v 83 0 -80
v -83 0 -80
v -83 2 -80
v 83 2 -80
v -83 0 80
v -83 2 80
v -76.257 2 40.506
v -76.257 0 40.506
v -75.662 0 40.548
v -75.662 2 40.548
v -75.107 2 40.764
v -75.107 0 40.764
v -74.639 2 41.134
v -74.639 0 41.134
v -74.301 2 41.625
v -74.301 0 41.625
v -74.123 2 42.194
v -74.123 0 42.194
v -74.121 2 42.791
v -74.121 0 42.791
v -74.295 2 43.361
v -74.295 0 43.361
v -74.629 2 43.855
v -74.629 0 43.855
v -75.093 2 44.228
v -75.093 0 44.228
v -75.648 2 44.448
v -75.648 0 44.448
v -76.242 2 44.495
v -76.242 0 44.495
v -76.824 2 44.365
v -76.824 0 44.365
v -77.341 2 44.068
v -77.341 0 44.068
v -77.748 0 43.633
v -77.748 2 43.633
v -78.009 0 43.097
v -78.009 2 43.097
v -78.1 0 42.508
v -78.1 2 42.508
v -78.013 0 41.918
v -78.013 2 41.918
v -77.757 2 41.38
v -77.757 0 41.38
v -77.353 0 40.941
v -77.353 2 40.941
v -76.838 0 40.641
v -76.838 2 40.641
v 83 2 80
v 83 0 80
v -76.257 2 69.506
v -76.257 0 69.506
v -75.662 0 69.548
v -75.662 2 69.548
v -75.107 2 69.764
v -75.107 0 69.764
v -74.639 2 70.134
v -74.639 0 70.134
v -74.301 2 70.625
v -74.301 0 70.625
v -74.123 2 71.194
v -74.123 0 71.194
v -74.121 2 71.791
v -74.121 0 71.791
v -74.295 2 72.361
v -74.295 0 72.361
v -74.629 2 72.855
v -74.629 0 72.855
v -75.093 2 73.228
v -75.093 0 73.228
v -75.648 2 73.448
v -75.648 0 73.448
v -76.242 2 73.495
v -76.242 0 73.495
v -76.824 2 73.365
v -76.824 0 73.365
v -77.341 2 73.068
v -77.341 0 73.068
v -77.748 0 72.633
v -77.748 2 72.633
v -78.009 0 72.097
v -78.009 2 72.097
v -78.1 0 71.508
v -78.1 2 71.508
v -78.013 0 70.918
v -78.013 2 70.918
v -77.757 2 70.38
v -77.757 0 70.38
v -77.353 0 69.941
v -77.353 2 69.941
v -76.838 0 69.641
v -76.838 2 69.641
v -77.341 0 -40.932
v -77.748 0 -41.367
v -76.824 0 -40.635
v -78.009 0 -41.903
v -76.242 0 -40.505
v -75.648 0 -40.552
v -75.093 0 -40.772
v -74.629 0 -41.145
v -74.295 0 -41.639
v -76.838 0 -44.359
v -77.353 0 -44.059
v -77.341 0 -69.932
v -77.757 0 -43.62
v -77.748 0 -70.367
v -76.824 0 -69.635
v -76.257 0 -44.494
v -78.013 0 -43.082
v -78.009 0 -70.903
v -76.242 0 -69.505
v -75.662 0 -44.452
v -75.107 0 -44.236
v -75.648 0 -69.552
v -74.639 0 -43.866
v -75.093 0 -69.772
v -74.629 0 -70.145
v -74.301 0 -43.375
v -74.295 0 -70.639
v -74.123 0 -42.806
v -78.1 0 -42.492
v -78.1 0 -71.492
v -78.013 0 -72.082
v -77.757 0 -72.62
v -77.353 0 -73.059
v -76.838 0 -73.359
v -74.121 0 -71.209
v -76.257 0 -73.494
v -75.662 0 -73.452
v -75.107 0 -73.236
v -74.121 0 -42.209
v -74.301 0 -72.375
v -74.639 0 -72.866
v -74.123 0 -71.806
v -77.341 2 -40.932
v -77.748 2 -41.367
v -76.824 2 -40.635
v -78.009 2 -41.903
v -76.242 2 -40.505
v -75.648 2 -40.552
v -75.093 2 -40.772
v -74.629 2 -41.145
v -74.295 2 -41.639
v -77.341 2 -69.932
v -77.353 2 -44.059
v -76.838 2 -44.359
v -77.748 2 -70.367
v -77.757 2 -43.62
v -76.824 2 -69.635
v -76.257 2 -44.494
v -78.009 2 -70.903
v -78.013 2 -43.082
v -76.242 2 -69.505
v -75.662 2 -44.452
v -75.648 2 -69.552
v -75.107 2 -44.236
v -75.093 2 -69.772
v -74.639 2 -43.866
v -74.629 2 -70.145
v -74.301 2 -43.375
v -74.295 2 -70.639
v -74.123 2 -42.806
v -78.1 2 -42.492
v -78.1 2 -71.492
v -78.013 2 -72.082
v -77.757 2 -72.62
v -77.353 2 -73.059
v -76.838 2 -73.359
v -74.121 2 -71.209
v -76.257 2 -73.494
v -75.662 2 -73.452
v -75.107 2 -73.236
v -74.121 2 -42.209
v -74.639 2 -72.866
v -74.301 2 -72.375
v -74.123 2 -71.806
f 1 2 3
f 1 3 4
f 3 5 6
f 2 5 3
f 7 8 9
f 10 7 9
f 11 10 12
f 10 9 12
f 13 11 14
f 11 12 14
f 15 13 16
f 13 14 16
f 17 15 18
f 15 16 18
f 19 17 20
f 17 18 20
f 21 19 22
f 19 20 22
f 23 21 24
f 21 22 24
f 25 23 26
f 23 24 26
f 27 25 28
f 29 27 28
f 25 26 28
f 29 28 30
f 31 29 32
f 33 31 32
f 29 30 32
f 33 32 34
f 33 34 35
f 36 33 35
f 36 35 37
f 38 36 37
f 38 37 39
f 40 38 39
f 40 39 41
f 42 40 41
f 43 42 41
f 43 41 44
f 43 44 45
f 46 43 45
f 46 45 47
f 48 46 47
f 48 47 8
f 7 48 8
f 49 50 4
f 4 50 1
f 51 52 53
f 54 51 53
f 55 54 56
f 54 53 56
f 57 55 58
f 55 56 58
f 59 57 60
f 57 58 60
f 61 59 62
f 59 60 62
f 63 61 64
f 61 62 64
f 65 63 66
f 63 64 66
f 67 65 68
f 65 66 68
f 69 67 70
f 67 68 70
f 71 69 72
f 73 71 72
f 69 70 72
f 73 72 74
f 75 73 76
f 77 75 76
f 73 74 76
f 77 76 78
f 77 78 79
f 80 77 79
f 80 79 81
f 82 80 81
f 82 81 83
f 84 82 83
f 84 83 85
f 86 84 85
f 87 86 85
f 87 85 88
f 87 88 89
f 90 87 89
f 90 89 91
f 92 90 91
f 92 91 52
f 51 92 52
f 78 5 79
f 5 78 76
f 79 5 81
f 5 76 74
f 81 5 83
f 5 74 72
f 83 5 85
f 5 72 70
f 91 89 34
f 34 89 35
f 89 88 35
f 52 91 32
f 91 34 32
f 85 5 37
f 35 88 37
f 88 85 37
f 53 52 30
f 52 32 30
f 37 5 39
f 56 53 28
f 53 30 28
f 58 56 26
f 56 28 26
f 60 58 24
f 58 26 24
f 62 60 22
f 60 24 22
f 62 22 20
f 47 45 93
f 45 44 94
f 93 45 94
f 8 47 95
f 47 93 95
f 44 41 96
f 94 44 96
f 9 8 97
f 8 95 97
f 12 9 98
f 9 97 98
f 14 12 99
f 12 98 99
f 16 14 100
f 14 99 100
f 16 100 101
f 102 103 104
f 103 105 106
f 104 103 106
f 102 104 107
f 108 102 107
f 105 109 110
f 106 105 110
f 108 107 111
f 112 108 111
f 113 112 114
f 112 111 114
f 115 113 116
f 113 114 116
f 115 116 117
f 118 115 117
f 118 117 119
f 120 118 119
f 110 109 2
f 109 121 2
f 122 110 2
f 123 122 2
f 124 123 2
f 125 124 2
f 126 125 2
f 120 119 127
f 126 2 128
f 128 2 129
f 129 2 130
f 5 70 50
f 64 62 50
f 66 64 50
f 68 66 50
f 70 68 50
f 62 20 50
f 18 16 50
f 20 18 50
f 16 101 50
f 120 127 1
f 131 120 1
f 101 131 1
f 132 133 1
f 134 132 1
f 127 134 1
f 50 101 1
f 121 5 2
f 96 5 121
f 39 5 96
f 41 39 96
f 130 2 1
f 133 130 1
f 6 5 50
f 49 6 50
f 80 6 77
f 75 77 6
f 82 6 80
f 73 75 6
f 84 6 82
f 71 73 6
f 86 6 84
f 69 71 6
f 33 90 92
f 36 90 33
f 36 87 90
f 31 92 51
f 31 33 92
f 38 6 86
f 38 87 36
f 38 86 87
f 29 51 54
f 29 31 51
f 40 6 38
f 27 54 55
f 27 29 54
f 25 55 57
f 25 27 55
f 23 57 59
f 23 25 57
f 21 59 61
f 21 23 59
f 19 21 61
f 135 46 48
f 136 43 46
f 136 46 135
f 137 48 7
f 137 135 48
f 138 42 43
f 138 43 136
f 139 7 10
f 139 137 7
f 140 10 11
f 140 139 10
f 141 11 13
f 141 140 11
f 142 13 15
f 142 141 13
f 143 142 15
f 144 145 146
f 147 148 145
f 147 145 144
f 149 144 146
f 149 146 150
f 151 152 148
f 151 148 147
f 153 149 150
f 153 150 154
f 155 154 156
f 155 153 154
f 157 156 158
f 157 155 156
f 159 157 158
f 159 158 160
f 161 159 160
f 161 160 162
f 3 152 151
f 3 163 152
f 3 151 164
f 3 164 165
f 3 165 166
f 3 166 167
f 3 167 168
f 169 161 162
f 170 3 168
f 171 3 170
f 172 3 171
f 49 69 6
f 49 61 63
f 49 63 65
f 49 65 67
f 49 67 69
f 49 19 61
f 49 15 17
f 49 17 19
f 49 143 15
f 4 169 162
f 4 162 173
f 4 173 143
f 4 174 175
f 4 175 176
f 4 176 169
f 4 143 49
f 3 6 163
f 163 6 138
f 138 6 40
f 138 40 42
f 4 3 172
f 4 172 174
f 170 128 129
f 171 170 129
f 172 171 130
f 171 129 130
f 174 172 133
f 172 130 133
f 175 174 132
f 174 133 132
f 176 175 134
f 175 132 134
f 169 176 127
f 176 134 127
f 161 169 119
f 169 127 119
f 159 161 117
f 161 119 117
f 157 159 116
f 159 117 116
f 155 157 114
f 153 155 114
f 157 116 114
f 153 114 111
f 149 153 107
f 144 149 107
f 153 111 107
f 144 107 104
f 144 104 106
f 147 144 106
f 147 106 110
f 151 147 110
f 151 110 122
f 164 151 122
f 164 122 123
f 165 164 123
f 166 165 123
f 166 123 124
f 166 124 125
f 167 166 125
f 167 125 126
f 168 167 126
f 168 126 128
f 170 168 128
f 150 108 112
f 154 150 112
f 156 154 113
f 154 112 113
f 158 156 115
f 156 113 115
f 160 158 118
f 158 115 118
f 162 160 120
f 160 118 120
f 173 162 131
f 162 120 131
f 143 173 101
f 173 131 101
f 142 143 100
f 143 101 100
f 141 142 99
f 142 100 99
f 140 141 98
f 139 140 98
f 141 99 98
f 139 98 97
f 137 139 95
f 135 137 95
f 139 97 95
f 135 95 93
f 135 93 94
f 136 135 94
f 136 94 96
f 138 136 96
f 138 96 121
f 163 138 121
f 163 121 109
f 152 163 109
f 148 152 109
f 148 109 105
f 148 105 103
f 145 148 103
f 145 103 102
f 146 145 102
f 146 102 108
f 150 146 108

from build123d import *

# Parameters (mm, degrees)
SKETCH_1_W      = 166
SKETCH_1_H      = 160
EXTRUDE_1_DEPTH = 2
MM_2_D          = 4
MM_2_DEPTH      = 10
MM_2_TIP        = 1.201721238


with BuildPart() as part:
    # 草图1 → 凸台-拉伸1 (new body)
    with BuildSketch(Plane(origin=(0, 0, 0), x_dir=(1, 0, 0), z_dir=(0, 1, 0))):
        Rectangle(SKETCH_1_W, SKETCH_1_H)
    extrude(amount=EXTRUDE_1_DEPTH)

    # 大小mm 暗销孔2
    with Locations(Plane(origin=(45.636831669, 2.8, 467.05931397), x_dir=(0.07852837759024327, 0, 0.9969118787099711), z_dir=(0, 1, 0))):
        with Locations((-404.949854974, -103.656881575), (-403.897574678, -90.298262111), (-432.80801916, -88.020939161), (-433.860299457, -101.379558625), (-547.50825363, -92.42732358), (-518.597809147, -94.70464653), (-517.545528888, -81.346027355), (-546.45597337, -79.068704405)):
            Hole(MM_2_D / 2, depth=MM_2_DEPTH)
            with Locations((0, 0, -(MM_2_DEPTH + MM_2_TIP / 2))):  # 118° drill point
                Cone(0, MM_2_D / 2, MM_2_TIP, mode=Mode.SUBTRACT)


solid = part.part
